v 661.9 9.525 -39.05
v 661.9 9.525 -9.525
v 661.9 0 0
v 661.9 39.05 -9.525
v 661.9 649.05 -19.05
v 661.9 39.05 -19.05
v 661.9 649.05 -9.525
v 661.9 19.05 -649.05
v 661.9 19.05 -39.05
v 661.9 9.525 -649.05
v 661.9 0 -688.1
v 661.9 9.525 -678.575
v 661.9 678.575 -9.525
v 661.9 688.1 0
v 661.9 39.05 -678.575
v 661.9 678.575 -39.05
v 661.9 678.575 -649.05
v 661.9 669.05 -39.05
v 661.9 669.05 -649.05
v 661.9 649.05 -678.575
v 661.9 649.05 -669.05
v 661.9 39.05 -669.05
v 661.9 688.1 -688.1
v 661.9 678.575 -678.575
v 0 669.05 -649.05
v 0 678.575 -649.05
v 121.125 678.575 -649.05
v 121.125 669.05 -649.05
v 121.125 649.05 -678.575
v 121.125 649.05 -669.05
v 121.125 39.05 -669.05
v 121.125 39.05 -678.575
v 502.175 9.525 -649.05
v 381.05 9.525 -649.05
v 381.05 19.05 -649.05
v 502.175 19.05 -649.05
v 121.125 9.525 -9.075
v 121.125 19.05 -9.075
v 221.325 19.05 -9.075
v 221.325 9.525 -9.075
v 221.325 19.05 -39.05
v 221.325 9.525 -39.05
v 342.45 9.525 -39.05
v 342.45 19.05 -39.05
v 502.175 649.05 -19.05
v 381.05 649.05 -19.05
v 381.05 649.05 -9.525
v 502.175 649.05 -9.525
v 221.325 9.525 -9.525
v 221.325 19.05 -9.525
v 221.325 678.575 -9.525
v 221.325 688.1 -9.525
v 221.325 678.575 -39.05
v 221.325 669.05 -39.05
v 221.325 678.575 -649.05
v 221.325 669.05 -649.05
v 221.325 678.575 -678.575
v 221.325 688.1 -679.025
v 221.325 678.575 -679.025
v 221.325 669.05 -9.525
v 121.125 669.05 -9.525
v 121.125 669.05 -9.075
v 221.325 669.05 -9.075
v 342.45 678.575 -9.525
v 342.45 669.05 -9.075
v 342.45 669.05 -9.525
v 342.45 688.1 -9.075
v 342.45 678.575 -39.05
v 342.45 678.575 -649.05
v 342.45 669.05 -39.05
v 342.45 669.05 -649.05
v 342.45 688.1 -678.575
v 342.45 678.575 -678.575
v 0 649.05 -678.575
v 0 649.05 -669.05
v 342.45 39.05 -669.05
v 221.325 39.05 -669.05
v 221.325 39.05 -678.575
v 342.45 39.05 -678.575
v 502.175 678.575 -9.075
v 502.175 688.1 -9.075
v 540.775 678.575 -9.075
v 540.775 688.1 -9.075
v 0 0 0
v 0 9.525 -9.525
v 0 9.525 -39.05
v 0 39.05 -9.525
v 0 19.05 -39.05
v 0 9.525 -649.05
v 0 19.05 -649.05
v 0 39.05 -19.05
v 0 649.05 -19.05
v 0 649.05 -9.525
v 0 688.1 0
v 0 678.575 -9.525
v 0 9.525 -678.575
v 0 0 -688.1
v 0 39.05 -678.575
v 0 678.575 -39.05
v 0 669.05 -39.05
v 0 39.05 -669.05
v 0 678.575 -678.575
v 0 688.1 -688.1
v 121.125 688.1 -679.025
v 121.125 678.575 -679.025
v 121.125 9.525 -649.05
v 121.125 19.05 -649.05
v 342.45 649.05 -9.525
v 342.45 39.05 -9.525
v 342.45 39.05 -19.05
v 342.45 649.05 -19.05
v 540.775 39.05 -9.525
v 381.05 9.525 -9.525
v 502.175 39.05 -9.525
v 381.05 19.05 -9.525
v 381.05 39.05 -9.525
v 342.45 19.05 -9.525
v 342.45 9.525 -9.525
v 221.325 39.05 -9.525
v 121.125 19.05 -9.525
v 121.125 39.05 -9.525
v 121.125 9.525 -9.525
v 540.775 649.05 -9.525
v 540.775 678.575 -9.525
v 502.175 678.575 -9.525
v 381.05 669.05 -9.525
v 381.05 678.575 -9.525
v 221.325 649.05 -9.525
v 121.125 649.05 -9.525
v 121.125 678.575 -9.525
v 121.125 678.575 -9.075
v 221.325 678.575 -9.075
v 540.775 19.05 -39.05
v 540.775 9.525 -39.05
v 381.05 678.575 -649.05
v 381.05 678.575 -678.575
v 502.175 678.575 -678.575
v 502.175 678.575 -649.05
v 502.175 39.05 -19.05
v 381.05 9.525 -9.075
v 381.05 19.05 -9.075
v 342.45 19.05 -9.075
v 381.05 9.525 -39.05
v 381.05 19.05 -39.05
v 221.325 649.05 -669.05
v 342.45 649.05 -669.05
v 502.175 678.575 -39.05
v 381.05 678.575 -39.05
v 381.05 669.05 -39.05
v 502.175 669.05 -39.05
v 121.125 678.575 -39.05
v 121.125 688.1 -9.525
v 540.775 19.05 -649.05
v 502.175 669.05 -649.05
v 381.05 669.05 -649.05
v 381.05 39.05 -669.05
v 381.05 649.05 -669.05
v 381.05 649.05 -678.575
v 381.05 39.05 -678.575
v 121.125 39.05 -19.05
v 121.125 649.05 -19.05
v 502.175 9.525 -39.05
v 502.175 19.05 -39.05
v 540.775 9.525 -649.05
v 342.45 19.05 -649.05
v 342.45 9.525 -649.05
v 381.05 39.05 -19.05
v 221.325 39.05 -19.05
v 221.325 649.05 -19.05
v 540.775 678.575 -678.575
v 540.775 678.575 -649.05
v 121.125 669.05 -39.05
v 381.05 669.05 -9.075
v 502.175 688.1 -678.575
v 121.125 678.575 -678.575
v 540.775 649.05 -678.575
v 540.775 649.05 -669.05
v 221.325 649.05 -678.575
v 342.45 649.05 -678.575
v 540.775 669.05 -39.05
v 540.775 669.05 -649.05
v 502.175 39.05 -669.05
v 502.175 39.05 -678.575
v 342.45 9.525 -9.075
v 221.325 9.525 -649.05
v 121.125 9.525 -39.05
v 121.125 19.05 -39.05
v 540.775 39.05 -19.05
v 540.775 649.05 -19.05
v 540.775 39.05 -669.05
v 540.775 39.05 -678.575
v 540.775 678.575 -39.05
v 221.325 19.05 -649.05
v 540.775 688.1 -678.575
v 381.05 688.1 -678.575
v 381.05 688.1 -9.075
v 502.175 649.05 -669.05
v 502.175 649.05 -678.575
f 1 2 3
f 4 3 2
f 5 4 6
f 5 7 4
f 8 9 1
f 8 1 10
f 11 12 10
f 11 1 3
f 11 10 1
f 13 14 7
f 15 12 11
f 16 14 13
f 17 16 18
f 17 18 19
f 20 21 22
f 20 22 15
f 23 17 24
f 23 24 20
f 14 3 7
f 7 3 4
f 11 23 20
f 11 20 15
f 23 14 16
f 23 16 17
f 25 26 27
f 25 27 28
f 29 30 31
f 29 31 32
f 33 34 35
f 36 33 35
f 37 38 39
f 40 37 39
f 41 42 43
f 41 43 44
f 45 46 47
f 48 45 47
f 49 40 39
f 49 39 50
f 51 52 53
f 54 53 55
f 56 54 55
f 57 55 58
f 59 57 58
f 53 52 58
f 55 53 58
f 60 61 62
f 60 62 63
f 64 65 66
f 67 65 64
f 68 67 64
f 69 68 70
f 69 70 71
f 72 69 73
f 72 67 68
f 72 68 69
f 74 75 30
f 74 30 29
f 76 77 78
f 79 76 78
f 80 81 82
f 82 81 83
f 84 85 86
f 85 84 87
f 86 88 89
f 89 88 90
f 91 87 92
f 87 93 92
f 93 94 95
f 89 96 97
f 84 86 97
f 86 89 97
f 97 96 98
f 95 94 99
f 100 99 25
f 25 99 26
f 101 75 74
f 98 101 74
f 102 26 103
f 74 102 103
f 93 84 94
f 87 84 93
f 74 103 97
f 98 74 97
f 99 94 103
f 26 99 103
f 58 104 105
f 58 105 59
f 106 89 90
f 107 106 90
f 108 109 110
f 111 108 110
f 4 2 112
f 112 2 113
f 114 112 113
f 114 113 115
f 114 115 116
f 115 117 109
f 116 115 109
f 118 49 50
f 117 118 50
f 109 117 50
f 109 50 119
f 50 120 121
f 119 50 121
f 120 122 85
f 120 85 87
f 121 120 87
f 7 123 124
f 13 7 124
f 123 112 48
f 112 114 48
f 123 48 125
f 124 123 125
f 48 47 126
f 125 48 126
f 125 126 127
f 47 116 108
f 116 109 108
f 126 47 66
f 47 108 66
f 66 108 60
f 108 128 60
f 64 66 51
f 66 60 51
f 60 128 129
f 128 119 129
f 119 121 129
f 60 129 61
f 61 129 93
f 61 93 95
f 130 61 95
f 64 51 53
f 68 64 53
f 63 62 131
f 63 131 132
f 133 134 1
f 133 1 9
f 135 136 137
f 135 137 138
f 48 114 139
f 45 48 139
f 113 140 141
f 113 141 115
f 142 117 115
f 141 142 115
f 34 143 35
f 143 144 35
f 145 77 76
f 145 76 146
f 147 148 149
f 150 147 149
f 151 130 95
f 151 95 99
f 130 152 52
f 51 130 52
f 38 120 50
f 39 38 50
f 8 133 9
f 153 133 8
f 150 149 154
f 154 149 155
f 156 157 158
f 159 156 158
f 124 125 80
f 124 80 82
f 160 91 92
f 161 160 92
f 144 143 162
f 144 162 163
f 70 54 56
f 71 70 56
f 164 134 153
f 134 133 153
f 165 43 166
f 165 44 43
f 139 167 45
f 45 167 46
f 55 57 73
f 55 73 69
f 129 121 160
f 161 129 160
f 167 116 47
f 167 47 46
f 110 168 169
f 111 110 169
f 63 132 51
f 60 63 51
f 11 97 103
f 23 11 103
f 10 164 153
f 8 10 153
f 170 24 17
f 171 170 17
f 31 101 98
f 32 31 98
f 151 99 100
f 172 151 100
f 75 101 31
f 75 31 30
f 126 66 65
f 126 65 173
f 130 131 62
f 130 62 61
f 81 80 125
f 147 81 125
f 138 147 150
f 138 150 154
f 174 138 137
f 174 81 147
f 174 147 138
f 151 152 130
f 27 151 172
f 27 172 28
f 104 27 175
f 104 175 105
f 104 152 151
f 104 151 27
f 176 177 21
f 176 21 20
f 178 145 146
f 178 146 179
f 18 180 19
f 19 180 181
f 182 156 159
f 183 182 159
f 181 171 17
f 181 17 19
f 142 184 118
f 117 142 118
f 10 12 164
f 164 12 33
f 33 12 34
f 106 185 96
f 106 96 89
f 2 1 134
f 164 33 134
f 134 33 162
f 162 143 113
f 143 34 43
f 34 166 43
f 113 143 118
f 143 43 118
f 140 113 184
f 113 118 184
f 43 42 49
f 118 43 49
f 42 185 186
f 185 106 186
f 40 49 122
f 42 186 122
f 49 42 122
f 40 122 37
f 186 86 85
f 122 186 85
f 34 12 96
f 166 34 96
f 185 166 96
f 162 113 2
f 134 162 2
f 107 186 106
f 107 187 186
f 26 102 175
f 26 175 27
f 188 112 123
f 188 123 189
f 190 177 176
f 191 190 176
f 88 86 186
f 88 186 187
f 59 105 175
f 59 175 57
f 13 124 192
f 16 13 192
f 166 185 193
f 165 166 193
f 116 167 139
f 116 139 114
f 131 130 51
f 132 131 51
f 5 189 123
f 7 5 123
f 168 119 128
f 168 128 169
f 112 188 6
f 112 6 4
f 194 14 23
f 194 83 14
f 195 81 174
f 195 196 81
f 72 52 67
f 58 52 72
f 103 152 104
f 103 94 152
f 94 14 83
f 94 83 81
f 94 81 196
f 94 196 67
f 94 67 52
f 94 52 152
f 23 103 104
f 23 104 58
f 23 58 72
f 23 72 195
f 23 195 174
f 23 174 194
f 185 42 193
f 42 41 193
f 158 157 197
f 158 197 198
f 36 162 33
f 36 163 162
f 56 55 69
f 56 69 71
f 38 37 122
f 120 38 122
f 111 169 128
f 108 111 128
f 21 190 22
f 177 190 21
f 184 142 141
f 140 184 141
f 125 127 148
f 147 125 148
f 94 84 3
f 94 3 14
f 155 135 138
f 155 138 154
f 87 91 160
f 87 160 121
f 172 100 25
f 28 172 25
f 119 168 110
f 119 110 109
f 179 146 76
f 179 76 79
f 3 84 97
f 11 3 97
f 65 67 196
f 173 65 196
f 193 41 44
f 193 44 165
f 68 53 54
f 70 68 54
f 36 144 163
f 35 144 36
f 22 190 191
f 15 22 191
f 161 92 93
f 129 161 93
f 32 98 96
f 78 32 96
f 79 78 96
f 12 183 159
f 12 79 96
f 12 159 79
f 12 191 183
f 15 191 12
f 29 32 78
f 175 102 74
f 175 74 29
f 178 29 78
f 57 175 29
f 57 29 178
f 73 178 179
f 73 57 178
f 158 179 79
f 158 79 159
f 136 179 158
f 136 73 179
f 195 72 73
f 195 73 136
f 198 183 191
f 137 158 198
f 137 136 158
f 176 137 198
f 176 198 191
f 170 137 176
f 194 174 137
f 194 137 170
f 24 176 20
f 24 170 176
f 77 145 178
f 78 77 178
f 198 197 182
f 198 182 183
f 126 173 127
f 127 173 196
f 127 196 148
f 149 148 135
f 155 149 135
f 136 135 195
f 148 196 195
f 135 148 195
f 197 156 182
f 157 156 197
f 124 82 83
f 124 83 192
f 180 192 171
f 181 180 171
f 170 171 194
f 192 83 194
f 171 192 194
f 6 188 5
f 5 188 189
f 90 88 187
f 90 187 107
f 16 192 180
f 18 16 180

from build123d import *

# Parameters (mm, degrees)
SKETCH1_W            = 688.1
SKETCH1_H            = 688.1
SKETCH1_W_2          = 650
SKETCH1_H_2          = 650
BOSS_EXTRUDE1_DEPTH  = 661.9
SKETCH3_W            = 100.2
SKETCH3_H            = 650
SKETCH3_W_2          = 38.6
CUT_EXTRUDE1_DEPTH   = 9.525
SKETCH4_W            = 100.2
SKETCH4_H            = 669.5
SKETCH4_W_2          = 38.6
SKETCH4_H_2          = 669.05
CUT_EXTRUDE3_DEPTH   = 9.525
SKETCH6_W            = 100.2
SKETCH6_H            = 669.5
SKETCH6_W_2          = 38.6
CUT_EXTRUDE4_DEPTH   = 9.525
CUT_EXTRUDE5_DEPTH   = 700
MIRROR6_COPY_1_DEPTH = 700


with BuildPart() as part:
    # Sketch1 → Boss-Extrude1 (new body)
    with BuildSketch(Plane(origin=(0, 0, 0), x_dir=(0, 0, -1), z_dir=(1, 0, 0))):
        with Locations((344.05, 344.05)):
            Rectangle(SKETCH1_W, SKETCH1_H)
        with Locations((344.05, 344.05)):
            Rectangle(SKETCH1_W_2, SKETCH1_H_2, mode=Mode.SUBTRACT)
    extrude(amount=BOSS_EXTRUDE1_DEPTH)

    # Sketch3 → Cut-Extrude1 (cut)
    with BuildSketch(Plane.XY.offset(-669.05)):
        with Locations((171.225, 344.05)):
            Rectangle(SKETCH3_W, SKETCH3_H)
        with Locations((361.75, 344.05)):
            Rectangle(SKETCH3_W_2, SKETCH3_H)
        with Locations((521.475, 344.05)):
            Rectangle(SKETCH3_W_2, SKETCH3_H)
    cut_extrude1 = extrude(amount=-CUT_EXTRUDE1_DEPTH, mode=Mode.SUBTRACT)

    # Mirror2: Cut-Extrude1 across plane
    add(cut_extrude1.mirror(Plane(origin=(0, 0, -344.05), x_dir=(1, 0, 0), z_dir=(0, 0, -1))), mode=Mode.SUBTRACT)

    # Sketch4 → Cut-Extrude3 (cut)
    with BuildSketch(Plane(origin=(0, 19.05, 0), x_dir=(1, 0, 0), z_dir=(0, 1, 0))):
        with Locations((171.225, 343.825)):
            Rectangle(SKETCH4_W, SKETCH4_H)
        with Locations((361.75, 343.825)):
            Rectangle(SKETCH4_W_2, SKETCH4_H)
        with Locations((521.475, 344.05)):
            Rectangle(SKETCH4_W_2, SKETCH4_H_2)
    cut_extrude3 = extrude(amount=-CUT_EXTRUDE3_DEPTH, mode=Mode.SUBTRACT)

    # Mirror4: Cut-Extrude3 across plane
    add(cut_extrude3.mirror(Plane.ZX.offset(344.05)), mode=Mode.SUBTRACT)

    # Sketch6 → Cut-Extrude4 (cut)
    with BuildSketch(Plane(origin=(0, 688.1, 0), x_dir=(1, 0, 0), z_dir=(0, 1, 0))):
        with Locations((171.225, 344.275)):
            Rectangle(SKETCH6_W, SKETCH6_H)
        with Locations((361.75, 343.825)):
            Rectangle(SKETCH6_W_2, SKETCH6_H)
        with Locations((521.475, 343.825)):
            Rectangle(SKETCH6_W_2, SKETCH6_H)
    extrude(amount=-CUT_EXTRUDE4_DEPTH, mode=Mode.SUBTRACT)

    # Sketch7 → Cut-Extrude5 (cut)
    with BuildSketch(Plane.ZY):
        Polygon((-19.05, 39.05), (-9.525, 39.05), (-9.525, 9.525), (-39.05, 9.525), (-39.05, 19.05), (-19.05, 19.05), align=None)
    cut_extrude5 = extrude(amount=-CUT_EXTRUDE5_DEPTH, mode=Mode.SUBTRACT)

    # Mirror5: Cut-Extrude5 across plane
    add(cut_extrude5.mirror(Plane(origin=(0, 0, -344.05), x_dir=(1, 0, 0), z_dir=(0, 0, -1))), mode=Mode.SUBTRACT)

    # Mirror6: Cut-Extrude5 across plane
    add(cut_extrude5.mirror(Plane.ZX.offset(344.05)), mode=Mode.SUBTRACT)

    # Mirror6 copy 1 sketch → Mirror6 copy 1 (cut)
    with BuildSketch(Plane(origin=(0, 688.1, -688.1), x_dir=(0, 0, -1), z_dir=(-1, 0, 0))):
        Polygon((-19.05, 39.05), (-9.525, 39.05), (-9.525, 9.525), (-39.05, 9.525), (-39.05, 19.05), (-19.05, 19.05), align=None)
    extrude(amount=-MIRROR6_COPY_1_DEPTH, mode=Mode.SUBTRACT)


solid = part.part
